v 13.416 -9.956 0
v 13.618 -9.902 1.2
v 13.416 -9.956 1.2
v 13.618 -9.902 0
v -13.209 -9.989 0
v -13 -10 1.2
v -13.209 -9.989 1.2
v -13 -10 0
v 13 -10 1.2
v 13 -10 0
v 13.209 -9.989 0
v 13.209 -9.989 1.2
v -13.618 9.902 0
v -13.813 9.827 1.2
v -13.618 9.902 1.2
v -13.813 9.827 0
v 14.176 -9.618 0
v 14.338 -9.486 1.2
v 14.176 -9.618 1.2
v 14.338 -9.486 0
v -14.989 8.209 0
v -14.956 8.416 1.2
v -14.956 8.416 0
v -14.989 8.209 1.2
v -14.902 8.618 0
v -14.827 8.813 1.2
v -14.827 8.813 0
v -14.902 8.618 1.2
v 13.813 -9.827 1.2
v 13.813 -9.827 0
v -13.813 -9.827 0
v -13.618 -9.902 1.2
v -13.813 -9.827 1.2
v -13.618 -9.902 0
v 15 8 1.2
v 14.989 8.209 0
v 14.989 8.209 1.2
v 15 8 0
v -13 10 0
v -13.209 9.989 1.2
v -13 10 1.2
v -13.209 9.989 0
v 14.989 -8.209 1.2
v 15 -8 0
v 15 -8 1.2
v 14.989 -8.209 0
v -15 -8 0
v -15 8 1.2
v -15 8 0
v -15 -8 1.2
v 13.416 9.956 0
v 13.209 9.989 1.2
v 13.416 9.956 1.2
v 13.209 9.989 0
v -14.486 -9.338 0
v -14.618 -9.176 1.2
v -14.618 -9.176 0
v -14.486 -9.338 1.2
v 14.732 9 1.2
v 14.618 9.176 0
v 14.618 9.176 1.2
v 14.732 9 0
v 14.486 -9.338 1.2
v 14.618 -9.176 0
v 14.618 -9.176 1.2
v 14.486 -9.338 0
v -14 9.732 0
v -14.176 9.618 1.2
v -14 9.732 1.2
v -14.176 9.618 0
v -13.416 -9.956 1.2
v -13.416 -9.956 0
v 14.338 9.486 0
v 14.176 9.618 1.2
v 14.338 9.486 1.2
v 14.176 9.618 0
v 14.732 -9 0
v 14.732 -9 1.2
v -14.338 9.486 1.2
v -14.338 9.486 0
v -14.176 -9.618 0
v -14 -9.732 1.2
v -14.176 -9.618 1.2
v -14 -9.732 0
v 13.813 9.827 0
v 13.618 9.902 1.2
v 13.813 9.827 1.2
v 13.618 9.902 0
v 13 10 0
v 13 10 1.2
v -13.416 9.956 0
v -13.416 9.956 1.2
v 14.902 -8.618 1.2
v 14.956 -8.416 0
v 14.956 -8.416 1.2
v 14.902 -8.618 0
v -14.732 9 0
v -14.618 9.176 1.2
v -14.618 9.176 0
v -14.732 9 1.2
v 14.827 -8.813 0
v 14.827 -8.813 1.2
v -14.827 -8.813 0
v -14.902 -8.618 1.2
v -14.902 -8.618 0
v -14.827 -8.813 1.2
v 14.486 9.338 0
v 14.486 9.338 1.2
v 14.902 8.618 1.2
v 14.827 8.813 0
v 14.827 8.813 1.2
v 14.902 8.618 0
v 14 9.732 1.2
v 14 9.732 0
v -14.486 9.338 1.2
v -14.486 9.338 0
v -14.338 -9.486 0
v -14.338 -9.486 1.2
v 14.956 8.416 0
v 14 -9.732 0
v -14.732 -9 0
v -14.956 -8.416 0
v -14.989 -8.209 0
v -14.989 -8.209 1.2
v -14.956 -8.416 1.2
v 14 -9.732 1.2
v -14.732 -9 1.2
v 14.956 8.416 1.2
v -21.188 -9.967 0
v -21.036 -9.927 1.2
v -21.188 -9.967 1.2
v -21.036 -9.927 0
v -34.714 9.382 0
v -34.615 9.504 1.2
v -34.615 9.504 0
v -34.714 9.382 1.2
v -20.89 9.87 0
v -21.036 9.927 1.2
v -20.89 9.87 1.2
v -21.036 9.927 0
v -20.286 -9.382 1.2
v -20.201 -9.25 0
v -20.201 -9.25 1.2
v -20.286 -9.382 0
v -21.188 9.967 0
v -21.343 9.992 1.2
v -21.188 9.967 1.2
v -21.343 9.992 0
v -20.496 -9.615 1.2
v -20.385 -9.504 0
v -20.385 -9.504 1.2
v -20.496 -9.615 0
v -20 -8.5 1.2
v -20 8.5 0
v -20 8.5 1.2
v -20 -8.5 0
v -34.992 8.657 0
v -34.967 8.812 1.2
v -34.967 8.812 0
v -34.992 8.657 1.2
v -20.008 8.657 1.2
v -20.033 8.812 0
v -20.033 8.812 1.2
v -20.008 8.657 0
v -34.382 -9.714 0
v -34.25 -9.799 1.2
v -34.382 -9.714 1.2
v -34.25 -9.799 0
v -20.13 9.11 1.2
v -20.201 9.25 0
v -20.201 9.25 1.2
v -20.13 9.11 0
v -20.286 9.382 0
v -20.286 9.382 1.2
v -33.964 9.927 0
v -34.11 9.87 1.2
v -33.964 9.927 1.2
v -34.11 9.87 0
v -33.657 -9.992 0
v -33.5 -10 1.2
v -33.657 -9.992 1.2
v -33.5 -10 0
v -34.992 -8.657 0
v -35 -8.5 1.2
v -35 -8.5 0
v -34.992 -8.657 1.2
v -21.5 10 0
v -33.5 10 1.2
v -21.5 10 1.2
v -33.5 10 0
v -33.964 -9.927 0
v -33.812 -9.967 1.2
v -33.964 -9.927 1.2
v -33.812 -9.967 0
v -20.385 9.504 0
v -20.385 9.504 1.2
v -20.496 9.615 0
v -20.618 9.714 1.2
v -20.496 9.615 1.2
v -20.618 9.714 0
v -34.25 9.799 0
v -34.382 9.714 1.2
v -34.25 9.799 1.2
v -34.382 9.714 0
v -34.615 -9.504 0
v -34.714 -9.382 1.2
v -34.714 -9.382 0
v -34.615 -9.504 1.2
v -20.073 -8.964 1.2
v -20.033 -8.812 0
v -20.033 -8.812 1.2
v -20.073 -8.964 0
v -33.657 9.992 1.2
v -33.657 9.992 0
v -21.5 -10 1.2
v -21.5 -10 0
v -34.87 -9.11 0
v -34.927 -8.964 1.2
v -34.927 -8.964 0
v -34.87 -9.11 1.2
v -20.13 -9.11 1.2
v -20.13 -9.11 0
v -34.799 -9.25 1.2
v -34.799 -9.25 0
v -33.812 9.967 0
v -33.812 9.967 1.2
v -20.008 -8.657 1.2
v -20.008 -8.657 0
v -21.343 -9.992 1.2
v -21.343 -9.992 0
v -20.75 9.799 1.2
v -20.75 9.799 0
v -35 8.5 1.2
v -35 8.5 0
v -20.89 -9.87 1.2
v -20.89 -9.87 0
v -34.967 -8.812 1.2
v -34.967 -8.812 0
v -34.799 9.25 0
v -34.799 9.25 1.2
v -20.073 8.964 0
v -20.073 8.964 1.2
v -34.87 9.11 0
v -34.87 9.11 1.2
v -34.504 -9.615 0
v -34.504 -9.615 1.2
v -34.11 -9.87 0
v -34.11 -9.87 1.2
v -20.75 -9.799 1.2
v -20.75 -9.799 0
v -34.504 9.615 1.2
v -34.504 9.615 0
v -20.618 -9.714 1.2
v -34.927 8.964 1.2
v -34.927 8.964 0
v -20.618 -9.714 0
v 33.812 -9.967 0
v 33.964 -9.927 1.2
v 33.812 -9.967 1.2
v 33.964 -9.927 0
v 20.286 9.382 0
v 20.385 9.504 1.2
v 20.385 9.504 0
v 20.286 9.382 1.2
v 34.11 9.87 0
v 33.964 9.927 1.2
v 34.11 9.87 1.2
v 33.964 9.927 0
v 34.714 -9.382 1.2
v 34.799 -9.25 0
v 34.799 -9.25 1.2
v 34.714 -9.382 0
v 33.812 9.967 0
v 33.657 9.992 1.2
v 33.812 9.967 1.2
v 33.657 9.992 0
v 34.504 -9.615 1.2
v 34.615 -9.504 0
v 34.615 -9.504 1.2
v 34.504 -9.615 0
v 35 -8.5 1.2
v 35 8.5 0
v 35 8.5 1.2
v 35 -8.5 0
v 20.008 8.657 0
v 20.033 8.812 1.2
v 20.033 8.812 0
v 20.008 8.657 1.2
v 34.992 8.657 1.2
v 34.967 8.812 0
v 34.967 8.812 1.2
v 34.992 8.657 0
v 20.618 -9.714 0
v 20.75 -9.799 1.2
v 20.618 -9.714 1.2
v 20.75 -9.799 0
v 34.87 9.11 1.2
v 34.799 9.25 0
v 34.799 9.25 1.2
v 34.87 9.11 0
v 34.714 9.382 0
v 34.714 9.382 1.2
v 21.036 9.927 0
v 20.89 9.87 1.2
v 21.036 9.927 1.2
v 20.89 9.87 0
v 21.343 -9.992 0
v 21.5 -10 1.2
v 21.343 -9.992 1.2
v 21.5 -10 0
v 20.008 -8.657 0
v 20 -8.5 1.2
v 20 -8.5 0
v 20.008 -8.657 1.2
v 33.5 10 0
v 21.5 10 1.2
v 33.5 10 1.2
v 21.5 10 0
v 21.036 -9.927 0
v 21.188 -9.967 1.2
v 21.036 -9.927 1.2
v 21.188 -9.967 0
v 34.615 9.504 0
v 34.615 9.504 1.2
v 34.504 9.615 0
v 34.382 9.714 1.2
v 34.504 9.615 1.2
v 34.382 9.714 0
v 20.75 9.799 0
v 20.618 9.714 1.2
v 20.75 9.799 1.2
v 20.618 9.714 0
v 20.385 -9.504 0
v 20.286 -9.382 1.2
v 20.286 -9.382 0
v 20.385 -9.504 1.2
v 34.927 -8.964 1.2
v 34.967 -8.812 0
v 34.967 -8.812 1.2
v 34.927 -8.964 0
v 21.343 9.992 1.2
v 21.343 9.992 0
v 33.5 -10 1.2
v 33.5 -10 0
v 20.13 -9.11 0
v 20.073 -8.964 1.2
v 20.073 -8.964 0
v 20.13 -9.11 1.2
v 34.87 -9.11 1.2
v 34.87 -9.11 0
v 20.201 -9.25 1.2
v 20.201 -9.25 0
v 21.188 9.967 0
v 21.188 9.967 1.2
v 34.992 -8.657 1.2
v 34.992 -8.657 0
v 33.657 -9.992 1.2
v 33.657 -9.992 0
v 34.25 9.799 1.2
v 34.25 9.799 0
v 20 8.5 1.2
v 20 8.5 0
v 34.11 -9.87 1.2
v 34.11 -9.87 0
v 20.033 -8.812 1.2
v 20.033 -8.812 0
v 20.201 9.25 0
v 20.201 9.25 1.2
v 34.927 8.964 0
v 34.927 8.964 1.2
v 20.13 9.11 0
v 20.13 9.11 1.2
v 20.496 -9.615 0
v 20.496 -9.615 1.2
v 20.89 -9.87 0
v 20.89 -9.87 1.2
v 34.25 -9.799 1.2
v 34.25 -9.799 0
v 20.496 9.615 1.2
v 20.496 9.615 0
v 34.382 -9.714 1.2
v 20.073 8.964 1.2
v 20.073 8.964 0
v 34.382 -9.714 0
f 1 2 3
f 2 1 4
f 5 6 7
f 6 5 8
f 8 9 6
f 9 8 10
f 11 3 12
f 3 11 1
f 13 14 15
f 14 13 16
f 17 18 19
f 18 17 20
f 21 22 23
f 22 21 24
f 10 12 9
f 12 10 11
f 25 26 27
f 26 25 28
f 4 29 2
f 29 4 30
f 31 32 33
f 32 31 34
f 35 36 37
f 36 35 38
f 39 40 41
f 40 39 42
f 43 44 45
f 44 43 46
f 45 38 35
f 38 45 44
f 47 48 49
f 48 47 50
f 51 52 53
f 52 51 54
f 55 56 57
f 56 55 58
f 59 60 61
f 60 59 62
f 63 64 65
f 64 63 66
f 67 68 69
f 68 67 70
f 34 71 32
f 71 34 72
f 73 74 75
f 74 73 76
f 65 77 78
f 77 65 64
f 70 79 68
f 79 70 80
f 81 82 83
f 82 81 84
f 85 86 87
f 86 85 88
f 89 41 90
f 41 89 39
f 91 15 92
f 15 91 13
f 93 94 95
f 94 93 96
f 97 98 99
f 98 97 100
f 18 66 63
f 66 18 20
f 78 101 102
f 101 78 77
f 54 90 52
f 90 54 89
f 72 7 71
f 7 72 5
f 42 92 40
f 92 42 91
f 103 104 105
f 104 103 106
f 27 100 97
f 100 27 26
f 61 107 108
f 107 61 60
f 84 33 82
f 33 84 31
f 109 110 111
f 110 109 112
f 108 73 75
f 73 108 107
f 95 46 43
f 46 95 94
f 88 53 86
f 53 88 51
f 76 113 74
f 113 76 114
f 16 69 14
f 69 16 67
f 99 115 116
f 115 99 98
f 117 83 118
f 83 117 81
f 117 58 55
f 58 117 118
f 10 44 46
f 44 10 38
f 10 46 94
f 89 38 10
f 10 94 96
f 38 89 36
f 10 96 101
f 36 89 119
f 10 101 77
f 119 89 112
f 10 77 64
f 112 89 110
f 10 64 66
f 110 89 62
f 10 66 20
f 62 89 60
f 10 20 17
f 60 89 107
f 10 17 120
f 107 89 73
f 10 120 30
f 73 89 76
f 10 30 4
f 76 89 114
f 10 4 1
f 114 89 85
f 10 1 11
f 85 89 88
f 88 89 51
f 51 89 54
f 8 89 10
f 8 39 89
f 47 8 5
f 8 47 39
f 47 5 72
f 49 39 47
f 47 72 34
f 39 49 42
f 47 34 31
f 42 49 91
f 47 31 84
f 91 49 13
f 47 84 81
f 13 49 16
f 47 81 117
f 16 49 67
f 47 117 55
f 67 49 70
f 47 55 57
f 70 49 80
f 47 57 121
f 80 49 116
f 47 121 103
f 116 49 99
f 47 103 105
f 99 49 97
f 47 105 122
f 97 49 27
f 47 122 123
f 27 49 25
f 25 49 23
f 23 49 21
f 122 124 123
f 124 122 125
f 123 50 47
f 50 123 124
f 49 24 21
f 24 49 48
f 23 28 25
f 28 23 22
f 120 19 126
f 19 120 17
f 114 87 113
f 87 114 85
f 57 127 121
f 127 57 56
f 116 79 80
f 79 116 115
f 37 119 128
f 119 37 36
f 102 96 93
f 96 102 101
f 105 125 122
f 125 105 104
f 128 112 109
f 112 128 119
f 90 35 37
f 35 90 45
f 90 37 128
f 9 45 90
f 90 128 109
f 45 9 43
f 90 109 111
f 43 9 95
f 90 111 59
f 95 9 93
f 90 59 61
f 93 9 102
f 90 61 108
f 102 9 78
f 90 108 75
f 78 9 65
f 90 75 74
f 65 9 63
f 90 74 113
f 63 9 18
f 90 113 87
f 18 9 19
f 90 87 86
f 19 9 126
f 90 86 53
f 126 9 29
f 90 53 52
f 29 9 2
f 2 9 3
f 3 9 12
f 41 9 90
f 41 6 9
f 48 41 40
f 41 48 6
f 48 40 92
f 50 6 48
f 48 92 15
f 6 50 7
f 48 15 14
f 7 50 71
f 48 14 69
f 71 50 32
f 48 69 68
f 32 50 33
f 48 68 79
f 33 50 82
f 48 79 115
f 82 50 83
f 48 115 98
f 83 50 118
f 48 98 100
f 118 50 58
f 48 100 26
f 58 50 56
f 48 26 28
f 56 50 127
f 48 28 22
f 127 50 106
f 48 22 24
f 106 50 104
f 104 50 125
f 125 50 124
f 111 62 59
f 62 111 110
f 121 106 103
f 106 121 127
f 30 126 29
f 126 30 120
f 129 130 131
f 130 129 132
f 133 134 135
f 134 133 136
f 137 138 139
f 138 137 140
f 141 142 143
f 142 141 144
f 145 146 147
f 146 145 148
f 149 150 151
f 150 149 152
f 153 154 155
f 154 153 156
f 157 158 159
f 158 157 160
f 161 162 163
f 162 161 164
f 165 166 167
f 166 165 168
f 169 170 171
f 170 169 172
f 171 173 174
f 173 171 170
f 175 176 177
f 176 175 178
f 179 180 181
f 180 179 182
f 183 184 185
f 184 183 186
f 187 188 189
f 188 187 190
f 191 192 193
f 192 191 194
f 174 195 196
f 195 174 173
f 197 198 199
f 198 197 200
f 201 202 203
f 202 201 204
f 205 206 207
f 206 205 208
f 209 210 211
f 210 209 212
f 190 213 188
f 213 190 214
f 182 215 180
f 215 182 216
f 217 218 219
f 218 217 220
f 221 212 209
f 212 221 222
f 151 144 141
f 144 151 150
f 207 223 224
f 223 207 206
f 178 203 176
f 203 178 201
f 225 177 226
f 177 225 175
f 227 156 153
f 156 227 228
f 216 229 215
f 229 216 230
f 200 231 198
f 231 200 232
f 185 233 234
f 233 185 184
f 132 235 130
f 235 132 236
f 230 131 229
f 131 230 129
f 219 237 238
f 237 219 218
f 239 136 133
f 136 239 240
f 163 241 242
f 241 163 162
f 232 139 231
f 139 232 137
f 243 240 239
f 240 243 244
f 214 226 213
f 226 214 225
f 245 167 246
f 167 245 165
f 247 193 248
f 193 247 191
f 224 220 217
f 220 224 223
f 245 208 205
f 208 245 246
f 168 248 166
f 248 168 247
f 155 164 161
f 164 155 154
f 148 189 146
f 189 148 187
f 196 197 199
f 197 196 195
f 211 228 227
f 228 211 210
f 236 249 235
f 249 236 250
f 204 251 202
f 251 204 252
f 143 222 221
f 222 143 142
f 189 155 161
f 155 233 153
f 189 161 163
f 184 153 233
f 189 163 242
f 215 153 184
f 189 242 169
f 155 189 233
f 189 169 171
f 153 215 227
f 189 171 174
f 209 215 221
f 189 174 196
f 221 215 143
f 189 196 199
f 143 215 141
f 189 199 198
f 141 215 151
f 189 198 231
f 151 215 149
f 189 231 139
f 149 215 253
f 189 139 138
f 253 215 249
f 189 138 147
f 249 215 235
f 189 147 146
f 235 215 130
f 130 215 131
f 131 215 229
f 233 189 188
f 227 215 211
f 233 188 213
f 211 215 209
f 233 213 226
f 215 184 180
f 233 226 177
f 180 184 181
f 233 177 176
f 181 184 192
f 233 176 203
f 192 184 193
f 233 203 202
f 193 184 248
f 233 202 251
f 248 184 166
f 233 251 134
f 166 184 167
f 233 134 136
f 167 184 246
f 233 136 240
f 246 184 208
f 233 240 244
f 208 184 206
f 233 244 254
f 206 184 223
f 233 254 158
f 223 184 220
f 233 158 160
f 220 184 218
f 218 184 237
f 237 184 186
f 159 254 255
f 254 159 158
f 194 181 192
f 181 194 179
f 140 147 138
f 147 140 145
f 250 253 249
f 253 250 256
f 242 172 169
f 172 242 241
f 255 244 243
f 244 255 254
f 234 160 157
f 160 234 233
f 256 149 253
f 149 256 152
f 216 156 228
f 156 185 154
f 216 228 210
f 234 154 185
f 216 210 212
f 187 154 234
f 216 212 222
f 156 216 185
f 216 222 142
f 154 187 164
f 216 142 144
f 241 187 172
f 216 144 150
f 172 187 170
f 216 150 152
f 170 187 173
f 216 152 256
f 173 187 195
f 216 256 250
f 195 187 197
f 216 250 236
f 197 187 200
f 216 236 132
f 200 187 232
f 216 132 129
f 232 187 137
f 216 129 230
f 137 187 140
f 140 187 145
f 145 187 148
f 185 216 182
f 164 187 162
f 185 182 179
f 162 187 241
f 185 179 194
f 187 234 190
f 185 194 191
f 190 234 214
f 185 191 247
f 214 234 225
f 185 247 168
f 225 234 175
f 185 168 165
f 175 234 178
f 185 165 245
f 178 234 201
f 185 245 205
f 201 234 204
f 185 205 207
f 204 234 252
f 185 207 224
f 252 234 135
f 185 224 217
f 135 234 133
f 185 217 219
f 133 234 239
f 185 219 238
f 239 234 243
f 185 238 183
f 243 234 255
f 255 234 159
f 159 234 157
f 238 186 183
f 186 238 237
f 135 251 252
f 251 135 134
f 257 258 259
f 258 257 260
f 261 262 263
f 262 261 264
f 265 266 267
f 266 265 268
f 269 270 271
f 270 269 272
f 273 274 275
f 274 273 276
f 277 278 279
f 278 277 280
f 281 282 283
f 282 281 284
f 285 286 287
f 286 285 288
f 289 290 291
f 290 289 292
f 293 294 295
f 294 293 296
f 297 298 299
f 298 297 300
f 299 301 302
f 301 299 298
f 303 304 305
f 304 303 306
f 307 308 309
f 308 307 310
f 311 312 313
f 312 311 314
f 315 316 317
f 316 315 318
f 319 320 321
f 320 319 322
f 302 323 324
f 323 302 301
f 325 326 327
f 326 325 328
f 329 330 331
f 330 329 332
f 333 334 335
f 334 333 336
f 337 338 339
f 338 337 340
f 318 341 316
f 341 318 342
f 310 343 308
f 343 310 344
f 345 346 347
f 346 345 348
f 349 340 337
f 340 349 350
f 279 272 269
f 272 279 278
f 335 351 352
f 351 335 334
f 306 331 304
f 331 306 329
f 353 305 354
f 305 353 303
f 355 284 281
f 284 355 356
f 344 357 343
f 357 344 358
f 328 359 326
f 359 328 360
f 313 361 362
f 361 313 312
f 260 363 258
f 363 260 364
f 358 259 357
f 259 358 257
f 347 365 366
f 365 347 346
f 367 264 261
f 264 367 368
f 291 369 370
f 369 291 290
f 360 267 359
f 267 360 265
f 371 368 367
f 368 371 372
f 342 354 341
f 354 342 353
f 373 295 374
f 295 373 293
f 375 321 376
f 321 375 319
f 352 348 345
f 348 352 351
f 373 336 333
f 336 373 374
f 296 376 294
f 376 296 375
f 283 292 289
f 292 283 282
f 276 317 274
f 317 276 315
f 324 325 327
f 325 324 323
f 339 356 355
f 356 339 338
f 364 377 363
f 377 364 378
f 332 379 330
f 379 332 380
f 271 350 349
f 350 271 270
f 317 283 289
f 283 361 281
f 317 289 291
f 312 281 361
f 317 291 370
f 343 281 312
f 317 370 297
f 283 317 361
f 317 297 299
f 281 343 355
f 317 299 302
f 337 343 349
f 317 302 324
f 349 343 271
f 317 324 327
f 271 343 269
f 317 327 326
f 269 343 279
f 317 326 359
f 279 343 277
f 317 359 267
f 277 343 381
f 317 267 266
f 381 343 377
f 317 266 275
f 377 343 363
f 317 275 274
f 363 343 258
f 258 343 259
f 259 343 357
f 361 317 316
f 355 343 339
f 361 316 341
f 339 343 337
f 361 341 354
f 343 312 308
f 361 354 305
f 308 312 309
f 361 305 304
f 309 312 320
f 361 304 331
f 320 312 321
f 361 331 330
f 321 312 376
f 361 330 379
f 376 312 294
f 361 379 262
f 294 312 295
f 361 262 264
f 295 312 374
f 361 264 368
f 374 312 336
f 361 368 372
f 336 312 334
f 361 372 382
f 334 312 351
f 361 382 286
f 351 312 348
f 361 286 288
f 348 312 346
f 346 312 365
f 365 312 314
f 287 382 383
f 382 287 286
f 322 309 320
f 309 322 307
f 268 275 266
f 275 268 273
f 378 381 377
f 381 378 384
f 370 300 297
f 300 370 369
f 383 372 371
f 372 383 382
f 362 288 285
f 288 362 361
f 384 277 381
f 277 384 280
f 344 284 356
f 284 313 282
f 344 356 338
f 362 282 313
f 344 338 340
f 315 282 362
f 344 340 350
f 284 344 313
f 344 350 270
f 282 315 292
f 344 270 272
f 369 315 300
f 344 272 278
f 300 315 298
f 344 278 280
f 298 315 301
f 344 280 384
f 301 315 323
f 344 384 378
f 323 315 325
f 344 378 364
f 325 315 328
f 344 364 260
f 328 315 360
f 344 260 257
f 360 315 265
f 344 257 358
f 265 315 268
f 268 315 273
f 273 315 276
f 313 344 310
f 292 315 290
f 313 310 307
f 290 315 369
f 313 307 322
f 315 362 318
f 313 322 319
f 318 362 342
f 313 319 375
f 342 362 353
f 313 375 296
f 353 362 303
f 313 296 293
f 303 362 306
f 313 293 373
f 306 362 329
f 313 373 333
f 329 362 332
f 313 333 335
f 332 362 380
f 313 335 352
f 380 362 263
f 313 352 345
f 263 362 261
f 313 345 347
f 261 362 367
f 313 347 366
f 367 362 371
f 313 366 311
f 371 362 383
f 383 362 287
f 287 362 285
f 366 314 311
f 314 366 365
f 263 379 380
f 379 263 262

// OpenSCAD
// file: common.scad
// common.scad — Shared parametric dimensions for Roam wrist-mount housing
// All dimensions in millimeters

// ── Body ──
body_length   = 90;    // along forearm axis
body_width    = 50;    // across forearm
body_height   = 25;    // dome peak above flat bottom
wall_thickness = 2.0;
corner_radius  = 5;

// ── Pico 2 W ──
pico_length = 52.3;
pico_width  = 21.0;
pico_height = 3.7;
pico_hole_spacing_l = 47.0;  // mounting hole center-to-center lengthwise
pico_hole_spacing_w = 11.4;  // mounting hole center-to-center widthwise
pico_hole_dia       = 2.1;   // M2 through-hole

// ── OLED 1.3" (SH1106 / SSD1306) ──
oled_board_width   = 35;
oled_board_height  = 34;
oled_board_thick   = 1.6;
oled_visible_width = 30;
oled_visible_height= 15;
oled_hole_spacing_w = 29;   // board mounting holes
oled_hole_spacing_h = 28;
oled_hole_dia       = 2.1;

// ── Buttons ──
button_diameter = 6;
button_spacing  = 14;   // center-to-center
button_travel   = 1.5;
button_well_depth = 3;  // depth of recessed well
button_well_dia   = 9;  // well outer diameter (button + clearance)

// ── USB-C ──
usbc_width  = 9.0;
usbc_height = 3.5;
usbc_radius = 1.5;   // corner rounding

// ── Band / Strap ──
band_width     = 25;
band_thickness = 3;   // silicone strap thickness
band_slot_depth= 3;
band_slot_clearance = 1;  // extra clearance around strap

// ── Battery (502535 LiPo) ──
battery_length = 35;
battery_width  = 25;
battery_height = 5;
battery_clearance = 0.5;

// ── Fasteners (M2 button head) ──
m2_screw_dia    = 2.2;   // clearance hole
m2_insert_dia   = 3.2;   // heat-set insert hole
m2_insert_depth = 4.0;
m2_head_dia     = 3.8;   // button head is ~3.8mm dia
m2_head_depth   = 1.0;   // button head is ~1mm tall (lower than socket)

// ── Button Caps ──
// Printed caps that sit in the button wells for better feel
button_cap_dia      = button_well_dia - 0.6;  // snug in well with clearance
button_cap_height   = button_well_depth - 0.5; // sits just below dome surface
button_cap_stem_dia = button_diameter - 0.2;   // contacts the tactile switch nub
button_cap_stem_h   = 2.0;                     // reaches down to switch
button_cap_dish     = 0.4;                     // concave top for finger grip

// ── Slide Switch (power, side-mounted) ──
// MSK-12C02 style: 7×3×1.5mm body, 1mm nub travel
switch_body_length = 7.0;
switch_body_width  = 3.0;
switch_body_height = 1.5;
switch_nub_width   = 1.5;   // slider nub that protrudes through slot
switch_nub_height  = 1.0;
switch_slot_length = switch_body_length + 2;  // travel + clearance
switch_slot_height = switch_nub_height + 0.6; // nub + clearance
switch_indicator_depth = 0.6;  // engraved color indicator recesses
switch_indicator_dia   = 3.0;  // circular indicator marks

// ── Ventilation ──
vent_slot_width  = 1.0;
vent_slot_length = 8.0;
vent_slot_spacing = 3.0;

// ── Derived ──
inner_length = body_length - 2 * wall_thickness;
inner_width  = body_width  - 2 * wall_thickness;
inner_height = body_height - wall_thickness;  // bottom wall only

// ── Tolerances ──
print_tolerance = 0.2;  // FDM clearance
$fn = 60;               // global resolution
// main file
// roam_tpu_pad.scad — TPU comfort pads for Roam lid (forearm side)
// Print in TPU (Shore 95A), glue into recessed markers on lid bottom
//
// Three pads: one central, two smaller near band slots
// Print all three in one go — they're laid out flat on the build plate

include <common.scad>

// Match the marker dimensions from roam_lid.scad
tpu_pad_length = 30;
tpu_pad_width  = 20;
tpu_thickness  = 1.2;  // slightly proud of the 0.4mm recess for cushion
tpu_small_length = 15;

// Central pad
module central_pad() {
    linear_extrude(height = tpu_thickness)
        offset(r = 2)
            offset(delta = -2)
                square([tpu_pad_length, tpu_pad_width], center = true);
}

// Smaller pad (near band slots)
module side_pad() {
    linear_extrude(height = tpu_thickness)
        offset(r = 1.5)
            offset(delta = -1.5)
                square([tpu_small_length, tpu_pad_width], center = true);
}

// All three pads laid out for printing
translate([0, 0, 0]) central_pad();
translate([-(tpu_pad_length/2 + tpu_small_length/2 + 5), 0, 0]) side_pad();
translate([ (tpu_pad_length/2 + tpu_small_length/2 + 5), 0, 0]) side_pad();
